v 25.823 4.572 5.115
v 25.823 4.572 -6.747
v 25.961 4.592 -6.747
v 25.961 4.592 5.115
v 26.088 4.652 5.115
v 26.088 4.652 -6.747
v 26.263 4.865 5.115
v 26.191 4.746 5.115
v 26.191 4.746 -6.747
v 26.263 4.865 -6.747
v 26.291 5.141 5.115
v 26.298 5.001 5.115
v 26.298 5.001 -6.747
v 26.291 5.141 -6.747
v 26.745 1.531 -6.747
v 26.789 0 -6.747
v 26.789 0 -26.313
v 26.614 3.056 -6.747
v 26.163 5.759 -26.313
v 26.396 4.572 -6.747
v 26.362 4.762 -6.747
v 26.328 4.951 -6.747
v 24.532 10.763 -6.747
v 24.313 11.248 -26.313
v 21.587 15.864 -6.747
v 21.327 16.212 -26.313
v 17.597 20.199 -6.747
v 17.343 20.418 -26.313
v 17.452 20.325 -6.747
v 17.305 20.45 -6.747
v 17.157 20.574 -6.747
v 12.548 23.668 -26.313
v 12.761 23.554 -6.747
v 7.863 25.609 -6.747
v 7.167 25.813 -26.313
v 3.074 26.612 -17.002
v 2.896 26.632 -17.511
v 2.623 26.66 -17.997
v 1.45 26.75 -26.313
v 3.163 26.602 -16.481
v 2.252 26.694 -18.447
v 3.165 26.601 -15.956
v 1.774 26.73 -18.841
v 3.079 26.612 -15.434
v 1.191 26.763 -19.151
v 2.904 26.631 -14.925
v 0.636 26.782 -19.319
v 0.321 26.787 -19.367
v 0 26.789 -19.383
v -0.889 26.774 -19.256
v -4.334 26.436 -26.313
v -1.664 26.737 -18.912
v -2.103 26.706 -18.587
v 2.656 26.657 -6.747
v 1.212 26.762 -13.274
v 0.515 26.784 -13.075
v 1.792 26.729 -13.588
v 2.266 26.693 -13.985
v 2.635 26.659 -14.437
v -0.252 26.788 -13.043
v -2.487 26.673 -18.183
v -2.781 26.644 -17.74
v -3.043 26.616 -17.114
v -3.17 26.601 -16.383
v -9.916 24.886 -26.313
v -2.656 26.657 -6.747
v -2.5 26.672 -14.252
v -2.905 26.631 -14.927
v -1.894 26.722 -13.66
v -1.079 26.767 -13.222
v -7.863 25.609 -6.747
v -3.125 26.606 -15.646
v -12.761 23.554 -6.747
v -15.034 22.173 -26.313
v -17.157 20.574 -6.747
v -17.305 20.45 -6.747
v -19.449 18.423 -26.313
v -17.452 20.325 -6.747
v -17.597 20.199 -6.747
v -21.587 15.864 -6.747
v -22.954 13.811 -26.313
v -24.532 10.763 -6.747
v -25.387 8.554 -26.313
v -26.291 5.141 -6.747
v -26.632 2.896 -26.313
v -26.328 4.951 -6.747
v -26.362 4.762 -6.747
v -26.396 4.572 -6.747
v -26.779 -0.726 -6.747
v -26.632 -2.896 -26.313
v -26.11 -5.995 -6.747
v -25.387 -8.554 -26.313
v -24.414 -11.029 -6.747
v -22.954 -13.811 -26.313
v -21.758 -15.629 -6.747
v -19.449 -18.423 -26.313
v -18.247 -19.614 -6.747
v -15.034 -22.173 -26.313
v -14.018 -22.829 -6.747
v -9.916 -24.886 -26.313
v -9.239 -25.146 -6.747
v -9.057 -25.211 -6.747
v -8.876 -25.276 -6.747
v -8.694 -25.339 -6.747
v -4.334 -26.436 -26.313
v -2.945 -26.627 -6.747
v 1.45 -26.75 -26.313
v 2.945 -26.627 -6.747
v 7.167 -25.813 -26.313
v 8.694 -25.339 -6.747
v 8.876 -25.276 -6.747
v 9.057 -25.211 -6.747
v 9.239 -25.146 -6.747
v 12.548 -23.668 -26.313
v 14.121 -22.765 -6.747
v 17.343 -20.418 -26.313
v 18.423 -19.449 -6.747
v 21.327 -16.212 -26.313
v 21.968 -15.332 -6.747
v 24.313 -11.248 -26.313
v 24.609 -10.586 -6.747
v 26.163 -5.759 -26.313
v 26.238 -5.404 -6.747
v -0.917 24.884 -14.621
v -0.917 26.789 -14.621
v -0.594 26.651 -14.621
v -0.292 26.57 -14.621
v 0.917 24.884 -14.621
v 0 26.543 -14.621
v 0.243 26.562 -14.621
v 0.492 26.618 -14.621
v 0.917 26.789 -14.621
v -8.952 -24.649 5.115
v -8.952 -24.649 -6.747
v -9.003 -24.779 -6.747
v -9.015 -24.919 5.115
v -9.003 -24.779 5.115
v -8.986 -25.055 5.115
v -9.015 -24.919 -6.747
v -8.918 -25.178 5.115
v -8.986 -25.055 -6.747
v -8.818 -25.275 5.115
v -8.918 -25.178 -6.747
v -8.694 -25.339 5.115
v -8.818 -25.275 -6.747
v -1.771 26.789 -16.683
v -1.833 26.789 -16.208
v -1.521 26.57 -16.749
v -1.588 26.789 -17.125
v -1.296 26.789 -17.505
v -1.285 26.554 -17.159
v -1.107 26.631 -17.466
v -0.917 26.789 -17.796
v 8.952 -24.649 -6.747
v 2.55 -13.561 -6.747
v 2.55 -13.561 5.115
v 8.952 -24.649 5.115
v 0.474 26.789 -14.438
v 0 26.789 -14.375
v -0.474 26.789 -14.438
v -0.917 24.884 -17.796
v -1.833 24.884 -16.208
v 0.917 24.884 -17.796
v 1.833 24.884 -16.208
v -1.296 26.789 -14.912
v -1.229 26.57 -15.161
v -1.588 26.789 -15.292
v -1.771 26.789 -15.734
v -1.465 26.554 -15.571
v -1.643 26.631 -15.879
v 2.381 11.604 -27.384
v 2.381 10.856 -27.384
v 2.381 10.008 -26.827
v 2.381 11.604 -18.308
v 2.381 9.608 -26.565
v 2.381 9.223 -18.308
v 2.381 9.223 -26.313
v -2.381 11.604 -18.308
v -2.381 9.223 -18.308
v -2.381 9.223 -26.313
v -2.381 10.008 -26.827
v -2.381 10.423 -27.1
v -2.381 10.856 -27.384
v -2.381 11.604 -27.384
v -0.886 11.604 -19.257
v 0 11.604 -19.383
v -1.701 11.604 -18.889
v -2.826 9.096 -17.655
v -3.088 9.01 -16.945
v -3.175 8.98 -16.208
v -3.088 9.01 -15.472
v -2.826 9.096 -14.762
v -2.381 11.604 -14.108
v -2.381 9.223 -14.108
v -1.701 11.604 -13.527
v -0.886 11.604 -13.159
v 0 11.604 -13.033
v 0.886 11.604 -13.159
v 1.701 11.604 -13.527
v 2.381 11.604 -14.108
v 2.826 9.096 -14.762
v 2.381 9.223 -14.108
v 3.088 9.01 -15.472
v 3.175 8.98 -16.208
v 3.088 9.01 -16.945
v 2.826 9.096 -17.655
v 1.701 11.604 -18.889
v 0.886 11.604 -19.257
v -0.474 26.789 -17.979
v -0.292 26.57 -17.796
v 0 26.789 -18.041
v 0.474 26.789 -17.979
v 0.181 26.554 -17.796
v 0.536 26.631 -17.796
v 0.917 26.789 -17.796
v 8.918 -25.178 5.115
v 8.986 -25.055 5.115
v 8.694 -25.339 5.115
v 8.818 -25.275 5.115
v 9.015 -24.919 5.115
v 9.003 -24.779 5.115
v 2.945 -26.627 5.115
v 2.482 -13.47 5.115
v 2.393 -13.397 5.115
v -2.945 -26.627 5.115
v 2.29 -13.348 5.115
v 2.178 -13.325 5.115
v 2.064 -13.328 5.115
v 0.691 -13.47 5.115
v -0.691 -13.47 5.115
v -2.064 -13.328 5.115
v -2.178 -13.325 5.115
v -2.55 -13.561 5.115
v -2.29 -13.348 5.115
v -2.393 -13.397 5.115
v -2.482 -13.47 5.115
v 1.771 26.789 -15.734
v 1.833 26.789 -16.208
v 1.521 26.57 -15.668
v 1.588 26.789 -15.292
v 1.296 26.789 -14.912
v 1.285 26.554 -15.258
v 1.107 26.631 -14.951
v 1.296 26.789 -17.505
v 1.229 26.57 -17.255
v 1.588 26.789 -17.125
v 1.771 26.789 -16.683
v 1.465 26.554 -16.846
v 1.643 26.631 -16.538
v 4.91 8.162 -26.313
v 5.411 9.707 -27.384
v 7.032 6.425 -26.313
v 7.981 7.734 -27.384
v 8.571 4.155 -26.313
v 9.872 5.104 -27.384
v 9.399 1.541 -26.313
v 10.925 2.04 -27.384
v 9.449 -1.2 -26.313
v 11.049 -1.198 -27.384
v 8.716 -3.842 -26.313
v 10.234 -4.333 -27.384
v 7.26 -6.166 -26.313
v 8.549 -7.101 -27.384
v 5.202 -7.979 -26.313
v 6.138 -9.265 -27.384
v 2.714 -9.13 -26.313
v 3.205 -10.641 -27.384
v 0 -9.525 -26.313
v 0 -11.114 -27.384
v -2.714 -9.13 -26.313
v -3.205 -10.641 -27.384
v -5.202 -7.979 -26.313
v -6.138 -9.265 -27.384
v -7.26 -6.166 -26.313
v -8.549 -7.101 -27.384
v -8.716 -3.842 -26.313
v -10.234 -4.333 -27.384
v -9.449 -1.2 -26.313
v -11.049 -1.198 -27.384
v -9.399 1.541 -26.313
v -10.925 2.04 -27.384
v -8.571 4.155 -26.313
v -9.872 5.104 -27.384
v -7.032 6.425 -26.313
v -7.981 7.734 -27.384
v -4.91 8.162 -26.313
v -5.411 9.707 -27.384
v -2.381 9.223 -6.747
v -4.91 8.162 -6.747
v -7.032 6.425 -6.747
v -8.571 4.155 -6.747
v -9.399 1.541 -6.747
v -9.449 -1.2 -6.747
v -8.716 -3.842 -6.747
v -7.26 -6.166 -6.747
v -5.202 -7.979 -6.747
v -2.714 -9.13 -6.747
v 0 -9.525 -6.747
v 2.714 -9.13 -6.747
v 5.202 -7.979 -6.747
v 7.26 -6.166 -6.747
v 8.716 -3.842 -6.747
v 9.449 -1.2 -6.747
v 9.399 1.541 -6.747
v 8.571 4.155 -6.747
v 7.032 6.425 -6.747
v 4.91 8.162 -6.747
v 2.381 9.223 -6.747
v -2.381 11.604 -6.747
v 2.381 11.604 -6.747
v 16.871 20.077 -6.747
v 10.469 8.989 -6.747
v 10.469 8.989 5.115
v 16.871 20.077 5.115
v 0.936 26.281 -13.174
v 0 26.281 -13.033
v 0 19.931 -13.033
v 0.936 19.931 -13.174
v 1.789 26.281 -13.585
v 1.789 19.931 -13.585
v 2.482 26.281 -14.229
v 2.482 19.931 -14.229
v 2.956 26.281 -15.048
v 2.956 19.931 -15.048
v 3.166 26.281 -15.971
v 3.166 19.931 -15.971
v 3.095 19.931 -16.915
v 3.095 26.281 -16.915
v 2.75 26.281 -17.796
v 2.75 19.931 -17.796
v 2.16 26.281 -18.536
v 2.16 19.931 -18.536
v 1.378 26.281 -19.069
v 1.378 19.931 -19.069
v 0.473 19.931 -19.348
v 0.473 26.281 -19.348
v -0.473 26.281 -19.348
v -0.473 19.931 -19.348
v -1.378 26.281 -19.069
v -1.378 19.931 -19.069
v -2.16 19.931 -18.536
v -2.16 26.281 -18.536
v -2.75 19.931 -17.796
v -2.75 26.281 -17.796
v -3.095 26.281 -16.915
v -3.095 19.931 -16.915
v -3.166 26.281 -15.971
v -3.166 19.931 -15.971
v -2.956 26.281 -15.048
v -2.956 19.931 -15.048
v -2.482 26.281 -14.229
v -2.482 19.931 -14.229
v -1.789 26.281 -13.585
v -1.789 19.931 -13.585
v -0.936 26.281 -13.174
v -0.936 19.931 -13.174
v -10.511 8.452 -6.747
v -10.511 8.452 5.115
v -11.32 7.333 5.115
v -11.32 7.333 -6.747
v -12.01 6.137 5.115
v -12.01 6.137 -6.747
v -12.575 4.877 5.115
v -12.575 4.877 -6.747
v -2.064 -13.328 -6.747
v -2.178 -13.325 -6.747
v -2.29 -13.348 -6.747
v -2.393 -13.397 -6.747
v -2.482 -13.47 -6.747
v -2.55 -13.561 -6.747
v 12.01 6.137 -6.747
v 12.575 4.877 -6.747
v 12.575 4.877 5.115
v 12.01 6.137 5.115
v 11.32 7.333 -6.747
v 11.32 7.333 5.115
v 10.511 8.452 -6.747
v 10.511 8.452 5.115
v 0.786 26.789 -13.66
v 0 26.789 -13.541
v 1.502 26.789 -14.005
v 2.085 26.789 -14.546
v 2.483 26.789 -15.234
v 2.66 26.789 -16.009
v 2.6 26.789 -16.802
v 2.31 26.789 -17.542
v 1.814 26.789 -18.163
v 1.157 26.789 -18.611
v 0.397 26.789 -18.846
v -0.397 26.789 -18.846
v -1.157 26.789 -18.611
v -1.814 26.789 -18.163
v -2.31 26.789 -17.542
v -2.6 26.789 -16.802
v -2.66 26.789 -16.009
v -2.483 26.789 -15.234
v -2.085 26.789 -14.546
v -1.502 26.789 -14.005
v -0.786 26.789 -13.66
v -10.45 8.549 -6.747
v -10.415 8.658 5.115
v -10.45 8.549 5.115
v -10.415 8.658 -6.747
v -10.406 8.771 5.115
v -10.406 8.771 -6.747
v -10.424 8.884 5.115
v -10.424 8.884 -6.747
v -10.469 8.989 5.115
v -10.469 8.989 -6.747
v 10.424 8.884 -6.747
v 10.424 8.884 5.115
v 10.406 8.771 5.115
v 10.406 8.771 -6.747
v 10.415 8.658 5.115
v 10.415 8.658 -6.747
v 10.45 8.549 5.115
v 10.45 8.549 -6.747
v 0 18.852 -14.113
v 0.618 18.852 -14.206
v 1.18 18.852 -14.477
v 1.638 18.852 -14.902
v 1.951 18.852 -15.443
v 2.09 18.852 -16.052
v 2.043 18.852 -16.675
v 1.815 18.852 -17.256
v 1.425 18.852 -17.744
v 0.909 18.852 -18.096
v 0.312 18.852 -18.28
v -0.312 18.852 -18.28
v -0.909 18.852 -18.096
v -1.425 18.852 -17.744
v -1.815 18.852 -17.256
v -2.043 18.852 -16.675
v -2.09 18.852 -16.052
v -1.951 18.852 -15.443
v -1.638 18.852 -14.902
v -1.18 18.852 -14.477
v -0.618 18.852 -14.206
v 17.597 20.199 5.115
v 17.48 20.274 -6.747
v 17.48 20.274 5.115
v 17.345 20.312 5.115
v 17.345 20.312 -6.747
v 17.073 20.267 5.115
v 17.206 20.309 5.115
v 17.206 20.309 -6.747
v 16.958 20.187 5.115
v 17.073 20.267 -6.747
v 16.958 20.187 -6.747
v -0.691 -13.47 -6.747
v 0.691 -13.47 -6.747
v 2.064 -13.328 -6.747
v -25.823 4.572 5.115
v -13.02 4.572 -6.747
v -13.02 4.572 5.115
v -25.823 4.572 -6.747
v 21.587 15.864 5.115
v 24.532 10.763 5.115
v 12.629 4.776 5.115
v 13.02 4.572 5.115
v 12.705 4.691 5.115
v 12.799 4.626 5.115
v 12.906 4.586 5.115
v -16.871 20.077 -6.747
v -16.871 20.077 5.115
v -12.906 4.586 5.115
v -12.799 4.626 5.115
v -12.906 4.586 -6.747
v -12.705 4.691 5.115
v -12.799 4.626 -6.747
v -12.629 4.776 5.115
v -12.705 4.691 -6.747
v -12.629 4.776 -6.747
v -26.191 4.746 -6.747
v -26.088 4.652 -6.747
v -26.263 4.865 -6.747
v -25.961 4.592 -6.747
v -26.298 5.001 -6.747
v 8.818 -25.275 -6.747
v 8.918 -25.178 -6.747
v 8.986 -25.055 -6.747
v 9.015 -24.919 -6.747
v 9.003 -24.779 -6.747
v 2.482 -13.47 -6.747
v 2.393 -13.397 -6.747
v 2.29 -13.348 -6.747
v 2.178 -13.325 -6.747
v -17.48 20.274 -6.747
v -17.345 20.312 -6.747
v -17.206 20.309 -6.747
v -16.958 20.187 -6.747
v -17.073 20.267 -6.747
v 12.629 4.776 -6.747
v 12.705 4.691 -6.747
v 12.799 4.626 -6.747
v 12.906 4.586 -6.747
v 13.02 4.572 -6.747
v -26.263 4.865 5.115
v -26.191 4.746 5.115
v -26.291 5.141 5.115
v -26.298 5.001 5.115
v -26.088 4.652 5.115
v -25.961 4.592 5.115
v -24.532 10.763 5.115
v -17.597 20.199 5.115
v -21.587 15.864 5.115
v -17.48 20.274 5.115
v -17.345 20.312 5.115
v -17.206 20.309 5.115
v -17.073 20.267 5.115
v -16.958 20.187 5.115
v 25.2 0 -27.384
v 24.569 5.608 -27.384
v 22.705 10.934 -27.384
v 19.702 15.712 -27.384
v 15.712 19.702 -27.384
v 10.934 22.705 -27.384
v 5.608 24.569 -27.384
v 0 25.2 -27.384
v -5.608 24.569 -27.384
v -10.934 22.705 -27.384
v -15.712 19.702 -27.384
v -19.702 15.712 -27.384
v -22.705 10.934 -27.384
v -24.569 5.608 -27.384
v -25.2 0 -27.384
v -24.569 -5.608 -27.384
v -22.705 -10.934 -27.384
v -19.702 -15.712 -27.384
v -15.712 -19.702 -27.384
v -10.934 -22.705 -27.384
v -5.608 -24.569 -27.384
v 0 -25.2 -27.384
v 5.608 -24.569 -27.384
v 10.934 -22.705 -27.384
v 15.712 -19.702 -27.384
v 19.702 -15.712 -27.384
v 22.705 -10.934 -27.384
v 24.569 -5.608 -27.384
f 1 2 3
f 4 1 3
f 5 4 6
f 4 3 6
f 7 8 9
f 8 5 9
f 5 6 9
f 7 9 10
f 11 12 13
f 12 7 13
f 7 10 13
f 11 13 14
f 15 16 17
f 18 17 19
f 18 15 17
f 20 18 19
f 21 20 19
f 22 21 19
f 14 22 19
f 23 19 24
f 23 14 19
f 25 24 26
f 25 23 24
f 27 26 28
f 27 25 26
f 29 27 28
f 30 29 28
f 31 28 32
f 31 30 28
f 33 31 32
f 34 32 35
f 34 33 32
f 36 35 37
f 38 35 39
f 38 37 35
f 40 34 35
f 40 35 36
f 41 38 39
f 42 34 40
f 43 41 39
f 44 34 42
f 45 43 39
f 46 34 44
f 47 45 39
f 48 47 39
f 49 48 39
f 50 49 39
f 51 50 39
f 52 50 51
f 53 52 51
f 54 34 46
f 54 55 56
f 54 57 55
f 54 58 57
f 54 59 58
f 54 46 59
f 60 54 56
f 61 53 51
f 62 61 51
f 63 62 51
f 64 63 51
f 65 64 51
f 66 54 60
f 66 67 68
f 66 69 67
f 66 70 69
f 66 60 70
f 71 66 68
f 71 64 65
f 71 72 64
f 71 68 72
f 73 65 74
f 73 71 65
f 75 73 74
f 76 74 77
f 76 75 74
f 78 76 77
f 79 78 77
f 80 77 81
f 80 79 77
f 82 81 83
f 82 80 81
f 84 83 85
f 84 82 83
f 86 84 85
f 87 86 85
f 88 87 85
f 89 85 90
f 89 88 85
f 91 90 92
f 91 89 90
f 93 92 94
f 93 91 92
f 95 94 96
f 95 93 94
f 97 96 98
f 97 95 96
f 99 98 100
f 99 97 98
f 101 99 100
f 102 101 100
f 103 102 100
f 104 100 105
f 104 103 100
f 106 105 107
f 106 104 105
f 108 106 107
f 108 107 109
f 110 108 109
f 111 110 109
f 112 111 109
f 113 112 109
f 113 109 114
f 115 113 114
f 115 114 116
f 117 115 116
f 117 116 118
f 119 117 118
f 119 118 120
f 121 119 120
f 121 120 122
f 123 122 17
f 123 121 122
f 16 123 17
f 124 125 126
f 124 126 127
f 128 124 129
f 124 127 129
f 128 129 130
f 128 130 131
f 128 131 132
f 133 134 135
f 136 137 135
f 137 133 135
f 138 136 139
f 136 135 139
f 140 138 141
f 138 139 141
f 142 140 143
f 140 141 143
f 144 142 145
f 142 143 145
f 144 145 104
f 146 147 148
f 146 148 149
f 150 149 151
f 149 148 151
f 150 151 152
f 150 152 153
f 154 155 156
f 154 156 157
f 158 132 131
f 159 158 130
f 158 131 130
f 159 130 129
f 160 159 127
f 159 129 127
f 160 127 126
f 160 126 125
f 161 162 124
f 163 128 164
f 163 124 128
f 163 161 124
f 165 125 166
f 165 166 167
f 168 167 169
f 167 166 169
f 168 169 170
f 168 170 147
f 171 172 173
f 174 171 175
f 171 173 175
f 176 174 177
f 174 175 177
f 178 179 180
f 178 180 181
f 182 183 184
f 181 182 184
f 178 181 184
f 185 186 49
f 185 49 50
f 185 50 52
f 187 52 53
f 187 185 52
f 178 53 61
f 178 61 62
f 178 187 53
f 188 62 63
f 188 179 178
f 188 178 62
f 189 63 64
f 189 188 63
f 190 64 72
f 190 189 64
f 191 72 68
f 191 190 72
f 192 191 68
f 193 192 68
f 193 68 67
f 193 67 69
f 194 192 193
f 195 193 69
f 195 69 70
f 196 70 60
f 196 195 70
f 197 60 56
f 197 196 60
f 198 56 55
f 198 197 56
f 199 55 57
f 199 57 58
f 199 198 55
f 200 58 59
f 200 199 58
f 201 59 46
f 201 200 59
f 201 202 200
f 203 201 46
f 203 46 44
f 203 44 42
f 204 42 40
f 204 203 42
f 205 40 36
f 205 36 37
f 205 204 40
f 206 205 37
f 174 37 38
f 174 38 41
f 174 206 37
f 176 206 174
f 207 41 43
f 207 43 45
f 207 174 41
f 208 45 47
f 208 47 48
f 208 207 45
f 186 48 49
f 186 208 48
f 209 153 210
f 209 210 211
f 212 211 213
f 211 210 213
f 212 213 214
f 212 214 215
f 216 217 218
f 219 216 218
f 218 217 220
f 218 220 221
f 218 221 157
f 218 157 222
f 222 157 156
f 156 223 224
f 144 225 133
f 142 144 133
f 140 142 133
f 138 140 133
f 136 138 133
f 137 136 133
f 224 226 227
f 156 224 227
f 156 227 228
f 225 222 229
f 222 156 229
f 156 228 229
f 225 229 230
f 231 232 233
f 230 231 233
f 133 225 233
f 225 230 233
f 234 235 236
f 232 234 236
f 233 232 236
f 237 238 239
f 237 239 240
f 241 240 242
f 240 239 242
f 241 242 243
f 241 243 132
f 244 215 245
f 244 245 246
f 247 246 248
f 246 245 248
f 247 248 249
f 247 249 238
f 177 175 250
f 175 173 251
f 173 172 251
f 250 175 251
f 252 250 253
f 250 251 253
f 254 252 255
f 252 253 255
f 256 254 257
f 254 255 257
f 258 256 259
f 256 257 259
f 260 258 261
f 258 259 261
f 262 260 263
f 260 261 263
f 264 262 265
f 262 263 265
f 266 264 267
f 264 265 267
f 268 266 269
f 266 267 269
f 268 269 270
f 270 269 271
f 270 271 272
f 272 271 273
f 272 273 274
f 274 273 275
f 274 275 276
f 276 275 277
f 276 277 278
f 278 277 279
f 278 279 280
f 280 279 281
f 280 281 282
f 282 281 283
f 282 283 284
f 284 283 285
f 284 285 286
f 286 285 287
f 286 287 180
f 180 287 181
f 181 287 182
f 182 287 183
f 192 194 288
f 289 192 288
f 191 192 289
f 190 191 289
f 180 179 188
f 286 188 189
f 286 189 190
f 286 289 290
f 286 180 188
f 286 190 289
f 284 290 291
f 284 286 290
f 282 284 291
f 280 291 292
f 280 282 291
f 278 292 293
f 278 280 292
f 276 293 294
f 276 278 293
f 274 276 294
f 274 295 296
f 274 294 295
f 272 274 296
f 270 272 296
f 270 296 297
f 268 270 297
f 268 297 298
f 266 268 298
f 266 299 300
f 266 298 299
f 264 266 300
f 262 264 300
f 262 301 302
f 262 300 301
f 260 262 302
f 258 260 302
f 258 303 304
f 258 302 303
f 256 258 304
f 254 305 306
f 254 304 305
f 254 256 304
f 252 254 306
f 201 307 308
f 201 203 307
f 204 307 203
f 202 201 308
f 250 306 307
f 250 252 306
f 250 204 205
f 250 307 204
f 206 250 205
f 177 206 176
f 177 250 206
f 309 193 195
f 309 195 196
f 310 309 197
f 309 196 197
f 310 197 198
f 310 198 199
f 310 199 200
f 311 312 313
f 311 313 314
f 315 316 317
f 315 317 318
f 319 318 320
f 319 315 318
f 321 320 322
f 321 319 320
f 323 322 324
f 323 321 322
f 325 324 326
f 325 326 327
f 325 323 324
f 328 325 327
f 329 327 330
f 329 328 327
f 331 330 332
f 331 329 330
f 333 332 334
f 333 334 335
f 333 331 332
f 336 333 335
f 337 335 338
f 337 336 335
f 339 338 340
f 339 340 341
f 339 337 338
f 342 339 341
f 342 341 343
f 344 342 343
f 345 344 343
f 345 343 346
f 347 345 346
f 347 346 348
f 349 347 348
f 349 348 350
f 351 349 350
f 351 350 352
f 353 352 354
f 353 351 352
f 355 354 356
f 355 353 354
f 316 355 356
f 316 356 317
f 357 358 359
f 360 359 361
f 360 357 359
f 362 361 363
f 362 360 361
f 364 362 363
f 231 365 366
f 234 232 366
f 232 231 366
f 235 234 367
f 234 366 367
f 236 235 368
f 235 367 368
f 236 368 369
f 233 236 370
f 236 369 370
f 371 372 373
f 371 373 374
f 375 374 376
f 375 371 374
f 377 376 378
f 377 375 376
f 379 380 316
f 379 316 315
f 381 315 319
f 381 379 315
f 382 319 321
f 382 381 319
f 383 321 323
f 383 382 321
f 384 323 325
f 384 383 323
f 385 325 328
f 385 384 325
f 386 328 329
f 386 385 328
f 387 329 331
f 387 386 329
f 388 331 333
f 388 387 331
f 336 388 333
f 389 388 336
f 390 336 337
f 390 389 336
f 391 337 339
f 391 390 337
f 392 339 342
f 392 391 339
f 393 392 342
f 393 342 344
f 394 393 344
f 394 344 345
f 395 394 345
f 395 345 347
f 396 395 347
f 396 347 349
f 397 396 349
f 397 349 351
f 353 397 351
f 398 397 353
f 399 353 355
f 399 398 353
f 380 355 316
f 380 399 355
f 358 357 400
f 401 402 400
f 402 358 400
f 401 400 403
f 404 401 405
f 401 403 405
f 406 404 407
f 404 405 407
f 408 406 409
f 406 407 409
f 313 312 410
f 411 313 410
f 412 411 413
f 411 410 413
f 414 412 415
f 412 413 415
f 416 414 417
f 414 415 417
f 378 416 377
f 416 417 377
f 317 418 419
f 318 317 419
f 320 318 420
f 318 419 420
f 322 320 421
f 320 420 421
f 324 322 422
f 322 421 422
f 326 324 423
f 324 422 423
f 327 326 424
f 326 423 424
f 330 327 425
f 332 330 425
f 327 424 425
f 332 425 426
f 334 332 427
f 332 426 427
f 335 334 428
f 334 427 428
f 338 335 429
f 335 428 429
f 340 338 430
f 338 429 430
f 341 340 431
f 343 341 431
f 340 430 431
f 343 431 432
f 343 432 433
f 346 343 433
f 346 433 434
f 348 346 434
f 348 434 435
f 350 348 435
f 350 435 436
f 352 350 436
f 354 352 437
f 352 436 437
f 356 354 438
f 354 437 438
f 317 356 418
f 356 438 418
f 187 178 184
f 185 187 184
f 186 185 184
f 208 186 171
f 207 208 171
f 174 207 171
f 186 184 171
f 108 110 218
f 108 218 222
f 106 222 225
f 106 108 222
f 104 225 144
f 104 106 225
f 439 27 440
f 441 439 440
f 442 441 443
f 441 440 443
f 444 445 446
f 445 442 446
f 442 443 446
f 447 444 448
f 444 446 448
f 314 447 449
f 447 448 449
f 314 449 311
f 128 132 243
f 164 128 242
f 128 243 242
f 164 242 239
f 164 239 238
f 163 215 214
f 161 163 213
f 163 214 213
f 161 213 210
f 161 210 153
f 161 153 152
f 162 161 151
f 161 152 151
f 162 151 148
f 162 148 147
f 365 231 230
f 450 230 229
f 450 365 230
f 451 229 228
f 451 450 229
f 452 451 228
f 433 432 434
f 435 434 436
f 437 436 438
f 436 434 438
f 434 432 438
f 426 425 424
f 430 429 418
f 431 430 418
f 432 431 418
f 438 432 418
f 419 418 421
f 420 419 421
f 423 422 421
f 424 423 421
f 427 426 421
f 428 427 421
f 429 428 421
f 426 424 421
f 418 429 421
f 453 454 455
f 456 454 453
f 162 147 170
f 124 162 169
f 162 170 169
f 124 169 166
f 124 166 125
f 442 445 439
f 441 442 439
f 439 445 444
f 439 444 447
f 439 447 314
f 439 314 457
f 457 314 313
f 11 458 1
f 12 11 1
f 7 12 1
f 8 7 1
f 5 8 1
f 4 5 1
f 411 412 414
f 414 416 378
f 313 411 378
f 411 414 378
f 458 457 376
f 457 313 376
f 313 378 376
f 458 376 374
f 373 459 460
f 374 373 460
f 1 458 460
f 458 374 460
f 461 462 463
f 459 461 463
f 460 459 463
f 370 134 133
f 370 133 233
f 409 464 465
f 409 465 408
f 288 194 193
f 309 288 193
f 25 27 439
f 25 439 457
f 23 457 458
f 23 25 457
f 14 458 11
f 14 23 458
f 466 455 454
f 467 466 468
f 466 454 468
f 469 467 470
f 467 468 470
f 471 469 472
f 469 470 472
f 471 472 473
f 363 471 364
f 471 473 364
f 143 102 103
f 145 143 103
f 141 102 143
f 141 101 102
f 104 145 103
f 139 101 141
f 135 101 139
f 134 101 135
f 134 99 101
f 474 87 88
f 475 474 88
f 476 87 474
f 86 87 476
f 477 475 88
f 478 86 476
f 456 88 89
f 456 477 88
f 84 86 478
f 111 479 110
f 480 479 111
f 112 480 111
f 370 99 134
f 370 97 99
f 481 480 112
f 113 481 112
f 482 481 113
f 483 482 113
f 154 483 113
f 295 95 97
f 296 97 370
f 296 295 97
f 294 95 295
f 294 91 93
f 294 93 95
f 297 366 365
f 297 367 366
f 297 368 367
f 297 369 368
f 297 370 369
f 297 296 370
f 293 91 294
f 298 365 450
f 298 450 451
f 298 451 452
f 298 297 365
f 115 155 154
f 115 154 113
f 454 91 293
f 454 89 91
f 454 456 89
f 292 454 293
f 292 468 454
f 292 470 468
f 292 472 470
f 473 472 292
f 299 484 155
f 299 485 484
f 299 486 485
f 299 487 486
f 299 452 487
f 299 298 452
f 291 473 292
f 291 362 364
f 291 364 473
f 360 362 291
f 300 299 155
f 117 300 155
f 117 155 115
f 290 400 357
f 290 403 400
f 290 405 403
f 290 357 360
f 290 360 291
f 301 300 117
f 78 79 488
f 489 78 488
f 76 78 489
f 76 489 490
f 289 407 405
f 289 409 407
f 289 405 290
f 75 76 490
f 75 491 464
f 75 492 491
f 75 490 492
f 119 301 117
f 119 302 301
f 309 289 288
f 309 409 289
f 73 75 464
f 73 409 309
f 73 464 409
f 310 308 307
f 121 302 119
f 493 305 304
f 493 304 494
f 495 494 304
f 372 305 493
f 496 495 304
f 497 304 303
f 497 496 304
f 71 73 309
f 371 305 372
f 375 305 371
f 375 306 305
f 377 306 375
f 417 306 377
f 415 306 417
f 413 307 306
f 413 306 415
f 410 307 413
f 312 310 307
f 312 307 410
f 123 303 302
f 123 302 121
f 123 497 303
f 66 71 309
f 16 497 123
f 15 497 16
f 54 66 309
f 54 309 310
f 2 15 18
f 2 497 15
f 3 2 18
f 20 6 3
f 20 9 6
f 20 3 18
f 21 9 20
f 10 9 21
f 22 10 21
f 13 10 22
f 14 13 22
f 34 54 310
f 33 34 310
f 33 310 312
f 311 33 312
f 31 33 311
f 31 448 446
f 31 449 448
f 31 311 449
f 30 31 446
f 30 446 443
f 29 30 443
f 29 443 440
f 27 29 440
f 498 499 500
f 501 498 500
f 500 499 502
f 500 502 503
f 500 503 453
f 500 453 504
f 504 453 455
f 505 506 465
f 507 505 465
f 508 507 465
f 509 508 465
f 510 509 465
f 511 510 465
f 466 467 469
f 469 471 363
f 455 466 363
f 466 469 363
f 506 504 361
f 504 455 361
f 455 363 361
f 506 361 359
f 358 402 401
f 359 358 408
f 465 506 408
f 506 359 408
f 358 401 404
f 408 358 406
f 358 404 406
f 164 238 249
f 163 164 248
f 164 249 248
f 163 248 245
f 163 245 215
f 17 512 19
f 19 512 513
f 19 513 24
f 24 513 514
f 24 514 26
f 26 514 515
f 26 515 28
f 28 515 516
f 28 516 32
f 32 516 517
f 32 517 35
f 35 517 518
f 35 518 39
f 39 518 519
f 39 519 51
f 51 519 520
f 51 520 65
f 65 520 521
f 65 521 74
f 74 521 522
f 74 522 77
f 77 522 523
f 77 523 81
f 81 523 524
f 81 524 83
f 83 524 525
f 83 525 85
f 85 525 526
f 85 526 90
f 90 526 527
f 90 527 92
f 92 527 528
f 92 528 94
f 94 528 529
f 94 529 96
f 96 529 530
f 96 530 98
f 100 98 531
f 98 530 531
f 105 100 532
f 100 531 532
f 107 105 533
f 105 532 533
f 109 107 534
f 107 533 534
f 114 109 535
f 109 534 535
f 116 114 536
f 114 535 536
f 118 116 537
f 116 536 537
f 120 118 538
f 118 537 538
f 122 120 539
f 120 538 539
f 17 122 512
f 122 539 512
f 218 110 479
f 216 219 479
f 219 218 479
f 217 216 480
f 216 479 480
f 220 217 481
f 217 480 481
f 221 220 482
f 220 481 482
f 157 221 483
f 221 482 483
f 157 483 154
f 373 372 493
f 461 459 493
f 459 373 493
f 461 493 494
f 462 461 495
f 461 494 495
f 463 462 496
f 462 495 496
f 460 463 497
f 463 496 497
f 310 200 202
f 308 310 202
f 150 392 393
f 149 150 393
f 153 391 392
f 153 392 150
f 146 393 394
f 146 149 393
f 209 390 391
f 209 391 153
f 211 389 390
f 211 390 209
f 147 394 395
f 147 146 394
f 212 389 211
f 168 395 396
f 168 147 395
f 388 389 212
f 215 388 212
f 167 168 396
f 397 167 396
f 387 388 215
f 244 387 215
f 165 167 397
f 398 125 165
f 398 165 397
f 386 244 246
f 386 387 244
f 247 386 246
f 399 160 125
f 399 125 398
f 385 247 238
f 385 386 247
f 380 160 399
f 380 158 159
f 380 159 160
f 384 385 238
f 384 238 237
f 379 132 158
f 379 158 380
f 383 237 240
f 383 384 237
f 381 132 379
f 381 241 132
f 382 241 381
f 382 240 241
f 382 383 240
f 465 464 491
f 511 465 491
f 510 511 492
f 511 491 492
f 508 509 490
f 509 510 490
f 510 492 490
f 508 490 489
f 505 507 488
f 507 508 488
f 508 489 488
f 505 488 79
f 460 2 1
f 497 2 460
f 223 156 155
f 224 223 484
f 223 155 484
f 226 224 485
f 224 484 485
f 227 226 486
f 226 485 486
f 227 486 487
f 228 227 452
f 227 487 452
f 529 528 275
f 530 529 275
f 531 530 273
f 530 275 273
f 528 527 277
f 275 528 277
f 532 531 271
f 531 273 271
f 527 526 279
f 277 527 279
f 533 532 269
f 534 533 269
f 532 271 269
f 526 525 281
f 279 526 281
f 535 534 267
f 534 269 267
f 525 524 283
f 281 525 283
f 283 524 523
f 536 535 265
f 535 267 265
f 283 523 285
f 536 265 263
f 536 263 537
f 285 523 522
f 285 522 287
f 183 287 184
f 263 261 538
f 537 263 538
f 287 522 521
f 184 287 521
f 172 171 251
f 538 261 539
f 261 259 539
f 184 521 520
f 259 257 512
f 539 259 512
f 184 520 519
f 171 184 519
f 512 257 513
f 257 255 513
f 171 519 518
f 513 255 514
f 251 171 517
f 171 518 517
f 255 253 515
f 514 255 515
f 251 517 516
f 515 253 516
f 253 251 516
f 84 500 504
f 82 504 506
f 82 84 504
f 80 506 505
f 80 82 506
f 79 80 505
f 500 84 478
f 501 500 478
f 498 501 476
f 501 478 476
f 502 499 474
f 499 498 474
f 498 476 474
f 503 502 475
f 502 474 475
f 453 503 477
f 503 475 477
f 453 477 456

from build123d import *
from OCP.BRepFilletAPI import BRepFilletAPI_MakeChamfer

# Parameters (mm, degrees)
BOSS_EXTRUDE1_START      = -6.746875
SKETCH1_R                = 26.7890625
BOSS_EXTRUDE1_DEPTH      = 20.6375
BOSS_EXTRUDE2_DEPTH      = 11.8618
FILLET1_R                = 0.476990821
CIRPATTERN1_COUNT        = 3
FILLET1_OF_CIRPATTERN1_R = 0.476990821
CUT_EXTRUDE5_DEPTH       = 47.746248335
CUT_EXTRUDE5_DEPTH_BACK  = 47.746248335
SKETCH15_R               = 9.525
CHAMFER1_SIZE            = 1.0715625
CHAMFER1_SIZE2           = 1.588656738
CUT_EXTRUDE1_DEPTH       = 47.746248335
CUT_EXTRUDE1_DEPTH_BACK  = 47.746248335
SKETCH5_R                = 3.175
CUT_EXTRUDE2_DEPTH       = 47.746248335
SKETCH6_R                = 3.175
BOSS_EXTRUDE3_DEPTH      = 7.9375
CUT_EXTRUDE3_DEPTH       = 1.905
CHAMFER3_SIZE            = 0.508
CHAMFER4_SIZE            = 1.0795


with BuildPart() as part:
    # Sketch1 → Boss-Extrude1 (new body)
    with BuildSketch(Plane.XY.offset(BOSS_EXTRUDE1_START)):
        Circle(SKETCH1_R)
    extrude(amount=-BOSS_EXTRUDE1_DEPTH)

    # Sketch2 → Boss-Extrude2 (add)
    with BuildSketch(Plane.XY.offset(-6.746875)):
        with BuildLine():
            Line((-9.238549561, -25.145637229), (-2.384954104, -13.274861682))
            ThreePointArc((-2.384954104, -13.274861682), (0, -13.4874), (2.384954104, -13.274861682))
            Line((2.384954104, -13.274861682), (9.238549561, -25.145637229))
            ThreePointArc((9.238549561, -25.145637229), (0, -26.7890625), (-9.238549561, -25.145637229))
        make_face()
    boss_extrude2 = extrude(amount=BOSS_EXTRUDE2_DEPTH)

    # Fillet1
    # the kernel refuses this fillet: 0.476990821 mm, written as the material it takes off along each edge
    with BuildSketch(Plane(origin=(-9.238549561, -25.145637229, -6.746875), x_dir=(0.9423194959651416, -0.33471475546202245, 0), z_dir=(0, 0, 1))) as fillet1_piece_1:
        with BuildLine():
            CenterArc((0.572952448, 0.476963054), FILLET1_R, 169.55519331, 101.063030663)
            Line((0.103865366, 0.563435893), (0, 0))
            ThreePointArc((0, 0), (0.28904955, -0.001559444), (0.5780991, 0))
        make_face()
    extrude(amount=13.307047751, mode=Mode.SUBTRACT)
    with BuildSketch(Plane(origin=(9.238549561, -25.145637229, -6.746875), x_dir=(-0.9423194959651411, -0.3347147554620237, 0), z_dir=(0, 0, 1))) as fillet1_piece_2:
        with BuildLine():
            CenterArc((0.572952448, -0.476963054), FILLET1_R, 89.381776027, 101.063030663)
            Line((0.103865366, -0.563435893), (0, 0))
            ThreePointArc((0, 0), (0.28904955, 0.001559444), (0.5780991, 0))
        make_face()
    extrude(amount=13.307047751, mode=Mode.SUBTRACT)
    with BuildSketch(Plane(origin=(2.384954104, -13.274861682, -6.746875), x_dir=(0.49999999999999706, -0.8660254037844404, 0), z_dir=(0, 0, 1))) as fillet1_piece_3:
        with BuildLine():
            CenterArc((0.330829178, -0.476990821), FILLET1_R, 90, 68.803855098)
            ThreePointArc((-0.113892323, -0.304529143), (-0.056028498, -0.152607773), (0, 0))
            Line((0, 0), (0.330829178, 0))
        make_face()
    extrude(amount=12.688872944, mode=Mode.SUBTRACT)
    with BuildSketch(Plane(origin=(-2.384954104, -13.274861682, -6.746875), x_dir=(0.9863015455813384, -0.16495229972286882, 0), z_dir=(0, 0, 1))) as fillet1_piece_4:
        with BuildLine():
            CenterArc((0.330879129, -0.476956172), FILLET1_R, 90.690608377, 68.803855098)
            Line((-0.115888763, -0.309867293), (0, 0))
            ThreePointArc((0, 0), (0.162564956, -0.000979741), (0.325129912, 0))
        make_face()
    extrude(amount=12.688872944, mode=Mode.SUBTRACT)

    # CirPattern1: Boss-Extrude2 ×3 about axis
    cirpattern1_axis = Axis((0, 0, 0), (0, 0, 1))
    for i in range(1, CIRPATTERN1_COUNT):
        add(boss_extrude2.rotate(cirpattern1_axis, i * 360 / CIRPATTERN1_COUNT))

    # Fillet1 of CirPattern1
    # the kernel refuses this fillet: 0.476990821 mm, written as the material it takes off along each edge
    with BuildSketch(Plane(origin=(26.396035415, 4.572, -6.746875), x_dir=(-0.18128826673094764, 0.9834299997181745, 0), z_dir=(0, 0, 1)), Plane(origin=(-17.157485854, 20.573637229, -6.746875), x_dir=(-0.761031229234182, -0.6487152442561451, 0), z_dir=(0, 0, 1))) as fillet1_of_cirpattern1_piece_1:
        with BuildLine():
            CenterArc((0.572952448, 0.476963054), FILLET1_OF_CIRPATTERN1_R, 169.55519331, 101.063030663)
            Line((0.103865366, 0.563435893), (0, 0))
            ThreePointArc((0, 0), (0.28904955, -0.001559444), (0.5780991, 0))
        make_face()
    extrude(amount=13.307047751, mode=Mode.SUBTRACT)
    with BuildSketch(Plane(origin=(17.157485854, 20.573637229, -6.746875), x_dir=(0.7610312292341833, -0.6487152442561435, 0), z_dir=(0, 0, 1)), Plane(origin=(-26.396035415, 4.572, -6.746875), x_dir=(0.181288266730962, 0.9834299997181718, 0), z_dir=(0, 0, 1))) as fillet1_of_cirpattern1_piece_2:
        with BuildLine():
            CenterArc((0.572952448, -0.476963054), FILLET1_OF_CIRPATTERN1_R, 89.381776027, 101.063030663)
            Line((0.103865366, -0.563435893), (0, 0))
            ThreePointArc((0, 0), (0.28904955, 0.001559444), (0.5780991, 0))
        make_face()
    extrude(amount=13.307047751, mode=Mode.SUBTRACT)
    with BuildSketch(Plane(origin=(10.303890396, 8.702861682, -6.746875), x_dir=(0.5000000000000006, 0.8660254037844383, 0), z_dir=(0, 0, 1)), Plane(origin=(-12.688844501, 4.572, -6.746875), x_dir=(-1, 0, 0), z_dir=(0, 0, 1))) as fillet1_of_cirpattern1_piece_3:
        with BuildLine():
            CenterArc((0.330829178, -0.476990821), FILLET1_OF_CIRPATTERN1_R, 90, 68.803855098)
            ThreePointArc((-0.113892323, -0.304529143), (-0.056028498, -0.152607773), (0, 0))
            Line((0, 0), (0.330829178, 0))
        make_face()
    extrude(amount=12.688872944, mode=Mode.SUBTRACT)
    with BuildSketch(Plane(origin=(12.688844501, 4.572, -6.746875), x_dir=(-0.3502978908180006, 0.9366383441267288, 0), z_dir=(0, 0, 1)), Plane(origin=(-10.303890396, 8.702861682, -6.746875), x_dir=(-0.6360036547633316, -0.7716860444038657, 0), z_dir=(0, 0, 1))) as fillet1_of_cirpattern1_piece_4:
        with BuildLine():
            CenterArc((0.330879129, -0.476956172), FILLET1_OF_CIRPATTERN1_R, 90.690608377, 68.803855098)
            Line((-0.115888763, -0.309867293), (0, 0))
            ThreePointArc((0, 0), (0.162564956, -0.000979741), (0.325129912, 0))
        make_face()
    extrude(amount=12.688872944, mode=Mode.SUBTRACT)

    # Sketch15 → Cut-Extrude5 (cut, two sides: drawn at the far end of the back side and taken through both)
    with BuildSketch(Plane.XY.offset(-CUT_EXTRUDE5_DEPTH_BACK)):
        Circle(SKETCH15_R)
    extrude(amount=CUT_EXTRUDE5_DEPTH + CUT_EXTRUDE5_DEPTH_BACK, mode=Mode.SUBTRACT)

    # Chamfer1: one chamfer whose edges measure the first distance from different faces: ONE call of the kernel's chamfer builder (chamfer() names one face for all edges)
    chamfer1_edges_1 = [part.edges().sort_by_distance(p)[0] for p in [
        (-26.7890625, 0, -27.384375),
    ]]
    chamfer1_side_1 = [part.faces().sort_by_distance(p)[0] for p in [
        (-26.7890625, 0, -17.065625),
    ]]
    chamfer1_edges_2 = [part.edges().sort_by_distance(p)[0] for p in [
        (-9.525, 0, -27.384375),
    ]]
    chamfer1_side_2 = [part.faces().sort_by_distance(p)[0] for p in [
        (-9.525, 0, -17.065625),
    ]]
    chamfer1 = BRepFilletAPI_MakeChamfer(part.part.solid().wrapped)
    for e in chamfer1_edges_1:
        chamfer1.Add(CHAMFER1_SIZE, CHAMFER1_SIZE2, e.wrapped, chamfer1_side_1[0].wrapped)  # the first distance lies on this face
    for e in chamfer1_edges_2:
        chamfer1.Add(CHAMFER1_SIZE, CHAMFER1_SIZE2, e.wrapped, chamfer1_side_2[0].wrapped)  # the first distance lies on this face
    add(Compound.cast(chamfer1.Shape()), mode=Mode.REPLACE)

    # Sketch4 → Cut-Extrude1 (cut, two sides: drawn at the far end of the back side and taken through both)
    with BuildSketch(Plane.XY.offset(-CUT_EXTRUDE1_DEPTH_BACK)):
        with BuildLine():
            Line((-2.38125, 11.603791593), (2.38125, 11.603791593))
            Line((2.38125, 11.603791593), (2.38125, 9.222541593))
            ThreePointArc((2.38125, 9.222541593), (0, 9.525), (-2.38125, 9.222541593))
            Line((-2.38125, 9.222541593), (-2.38125, 11.603791593))
        make_face()
    extrude(amount=CUT_EXTRUDE1_DEPTH + CUT_EXTRUDE1_DEPTH_BACK, mode=Mode.SUBTRACT)

    # Sketch5 → Cut-Extrude2 (cut, through all)
    with BuildSketch(Plane(origin=(0, 0, 0), x_dir=(1, 0, 0), z_dir=(0, 1, 0))):
        with Locations(Location((0, 16.208375, 0), (0, 0, 90))):
            Circle(SKETCH5_R)
    extrude(amount=CUT_EXTRUDE2_DEPTH, mode=Mode.SUBTRACT)


with BuildPart() as body_2:
    # Sketch6 → Boss-Extrude3 (new body)
    with BuildSketch(Plane(origin=(0, 26.7890625, 0), x_dir=(-1, 0, 0), z_dir=(0, 1, 0))):
        with Locations(Location((0, -16.208375, 0), (0, 0, 90))):
            Circle(SKETCH6_R)
    extrude(amount=-BOSS_EXTRUDE3_DEPTH)

    # Sketch8 → Cut-Extrude3 (cut)
    with BuildSketch(Plane(origin=(0, 26.7890625, 0), x_dir=(1, 0, 0), z_dir=(0, 1, 0))):
        Polygon((0.916543552, 14.620875), (1.833087105, 16.208375), (0.916543552, 17.795875), (-0.916543552, 17.795875), (-1.833087105, 16.208375), (-0.916543552, 14.620875), align=None)
    extrude(amount=-CUT_EXTRUDE3_DEPTH, mode=Mode.SUBTRACT)

    # Cut-Extrude4 cone 1 section (through the dimple's axis) → Cut-Extrude4 (revolve, cut)
    with BuildSketch(Plane(origin=(0, 26.7890625, -16.208375), x_dir=(0, 0, 1), z_dir=(1, 0, 0))):
        Polygon((0, 0), (1.833087105, 0), (0, 1.833087105), align=None)
    revolve(axis=Axis((0, 26.7890625, -16.208375), (0, -1, 0)), mode=Mode.SUBTRACT)

    # Chamfer3
    chamfer3_edges = [body_2.edges().sort_by_distance(p)[0] for p in [
        (0, 26.7890625, -19.383375),
    ]]
    chamfer(chamfer3_edges, length=CHAMFER3_SIZE)

    # Chamfer4
    chamfer4_edges = [body_2.edges().sort_by_distance(p)[0] for p in [
        (0, 18.8515625, -19.383375),
    ]]
    chamfer(chamfer4_edges, length=CHAMFER4_SIZE)


solid = Compound([part.part, body_2.part])
